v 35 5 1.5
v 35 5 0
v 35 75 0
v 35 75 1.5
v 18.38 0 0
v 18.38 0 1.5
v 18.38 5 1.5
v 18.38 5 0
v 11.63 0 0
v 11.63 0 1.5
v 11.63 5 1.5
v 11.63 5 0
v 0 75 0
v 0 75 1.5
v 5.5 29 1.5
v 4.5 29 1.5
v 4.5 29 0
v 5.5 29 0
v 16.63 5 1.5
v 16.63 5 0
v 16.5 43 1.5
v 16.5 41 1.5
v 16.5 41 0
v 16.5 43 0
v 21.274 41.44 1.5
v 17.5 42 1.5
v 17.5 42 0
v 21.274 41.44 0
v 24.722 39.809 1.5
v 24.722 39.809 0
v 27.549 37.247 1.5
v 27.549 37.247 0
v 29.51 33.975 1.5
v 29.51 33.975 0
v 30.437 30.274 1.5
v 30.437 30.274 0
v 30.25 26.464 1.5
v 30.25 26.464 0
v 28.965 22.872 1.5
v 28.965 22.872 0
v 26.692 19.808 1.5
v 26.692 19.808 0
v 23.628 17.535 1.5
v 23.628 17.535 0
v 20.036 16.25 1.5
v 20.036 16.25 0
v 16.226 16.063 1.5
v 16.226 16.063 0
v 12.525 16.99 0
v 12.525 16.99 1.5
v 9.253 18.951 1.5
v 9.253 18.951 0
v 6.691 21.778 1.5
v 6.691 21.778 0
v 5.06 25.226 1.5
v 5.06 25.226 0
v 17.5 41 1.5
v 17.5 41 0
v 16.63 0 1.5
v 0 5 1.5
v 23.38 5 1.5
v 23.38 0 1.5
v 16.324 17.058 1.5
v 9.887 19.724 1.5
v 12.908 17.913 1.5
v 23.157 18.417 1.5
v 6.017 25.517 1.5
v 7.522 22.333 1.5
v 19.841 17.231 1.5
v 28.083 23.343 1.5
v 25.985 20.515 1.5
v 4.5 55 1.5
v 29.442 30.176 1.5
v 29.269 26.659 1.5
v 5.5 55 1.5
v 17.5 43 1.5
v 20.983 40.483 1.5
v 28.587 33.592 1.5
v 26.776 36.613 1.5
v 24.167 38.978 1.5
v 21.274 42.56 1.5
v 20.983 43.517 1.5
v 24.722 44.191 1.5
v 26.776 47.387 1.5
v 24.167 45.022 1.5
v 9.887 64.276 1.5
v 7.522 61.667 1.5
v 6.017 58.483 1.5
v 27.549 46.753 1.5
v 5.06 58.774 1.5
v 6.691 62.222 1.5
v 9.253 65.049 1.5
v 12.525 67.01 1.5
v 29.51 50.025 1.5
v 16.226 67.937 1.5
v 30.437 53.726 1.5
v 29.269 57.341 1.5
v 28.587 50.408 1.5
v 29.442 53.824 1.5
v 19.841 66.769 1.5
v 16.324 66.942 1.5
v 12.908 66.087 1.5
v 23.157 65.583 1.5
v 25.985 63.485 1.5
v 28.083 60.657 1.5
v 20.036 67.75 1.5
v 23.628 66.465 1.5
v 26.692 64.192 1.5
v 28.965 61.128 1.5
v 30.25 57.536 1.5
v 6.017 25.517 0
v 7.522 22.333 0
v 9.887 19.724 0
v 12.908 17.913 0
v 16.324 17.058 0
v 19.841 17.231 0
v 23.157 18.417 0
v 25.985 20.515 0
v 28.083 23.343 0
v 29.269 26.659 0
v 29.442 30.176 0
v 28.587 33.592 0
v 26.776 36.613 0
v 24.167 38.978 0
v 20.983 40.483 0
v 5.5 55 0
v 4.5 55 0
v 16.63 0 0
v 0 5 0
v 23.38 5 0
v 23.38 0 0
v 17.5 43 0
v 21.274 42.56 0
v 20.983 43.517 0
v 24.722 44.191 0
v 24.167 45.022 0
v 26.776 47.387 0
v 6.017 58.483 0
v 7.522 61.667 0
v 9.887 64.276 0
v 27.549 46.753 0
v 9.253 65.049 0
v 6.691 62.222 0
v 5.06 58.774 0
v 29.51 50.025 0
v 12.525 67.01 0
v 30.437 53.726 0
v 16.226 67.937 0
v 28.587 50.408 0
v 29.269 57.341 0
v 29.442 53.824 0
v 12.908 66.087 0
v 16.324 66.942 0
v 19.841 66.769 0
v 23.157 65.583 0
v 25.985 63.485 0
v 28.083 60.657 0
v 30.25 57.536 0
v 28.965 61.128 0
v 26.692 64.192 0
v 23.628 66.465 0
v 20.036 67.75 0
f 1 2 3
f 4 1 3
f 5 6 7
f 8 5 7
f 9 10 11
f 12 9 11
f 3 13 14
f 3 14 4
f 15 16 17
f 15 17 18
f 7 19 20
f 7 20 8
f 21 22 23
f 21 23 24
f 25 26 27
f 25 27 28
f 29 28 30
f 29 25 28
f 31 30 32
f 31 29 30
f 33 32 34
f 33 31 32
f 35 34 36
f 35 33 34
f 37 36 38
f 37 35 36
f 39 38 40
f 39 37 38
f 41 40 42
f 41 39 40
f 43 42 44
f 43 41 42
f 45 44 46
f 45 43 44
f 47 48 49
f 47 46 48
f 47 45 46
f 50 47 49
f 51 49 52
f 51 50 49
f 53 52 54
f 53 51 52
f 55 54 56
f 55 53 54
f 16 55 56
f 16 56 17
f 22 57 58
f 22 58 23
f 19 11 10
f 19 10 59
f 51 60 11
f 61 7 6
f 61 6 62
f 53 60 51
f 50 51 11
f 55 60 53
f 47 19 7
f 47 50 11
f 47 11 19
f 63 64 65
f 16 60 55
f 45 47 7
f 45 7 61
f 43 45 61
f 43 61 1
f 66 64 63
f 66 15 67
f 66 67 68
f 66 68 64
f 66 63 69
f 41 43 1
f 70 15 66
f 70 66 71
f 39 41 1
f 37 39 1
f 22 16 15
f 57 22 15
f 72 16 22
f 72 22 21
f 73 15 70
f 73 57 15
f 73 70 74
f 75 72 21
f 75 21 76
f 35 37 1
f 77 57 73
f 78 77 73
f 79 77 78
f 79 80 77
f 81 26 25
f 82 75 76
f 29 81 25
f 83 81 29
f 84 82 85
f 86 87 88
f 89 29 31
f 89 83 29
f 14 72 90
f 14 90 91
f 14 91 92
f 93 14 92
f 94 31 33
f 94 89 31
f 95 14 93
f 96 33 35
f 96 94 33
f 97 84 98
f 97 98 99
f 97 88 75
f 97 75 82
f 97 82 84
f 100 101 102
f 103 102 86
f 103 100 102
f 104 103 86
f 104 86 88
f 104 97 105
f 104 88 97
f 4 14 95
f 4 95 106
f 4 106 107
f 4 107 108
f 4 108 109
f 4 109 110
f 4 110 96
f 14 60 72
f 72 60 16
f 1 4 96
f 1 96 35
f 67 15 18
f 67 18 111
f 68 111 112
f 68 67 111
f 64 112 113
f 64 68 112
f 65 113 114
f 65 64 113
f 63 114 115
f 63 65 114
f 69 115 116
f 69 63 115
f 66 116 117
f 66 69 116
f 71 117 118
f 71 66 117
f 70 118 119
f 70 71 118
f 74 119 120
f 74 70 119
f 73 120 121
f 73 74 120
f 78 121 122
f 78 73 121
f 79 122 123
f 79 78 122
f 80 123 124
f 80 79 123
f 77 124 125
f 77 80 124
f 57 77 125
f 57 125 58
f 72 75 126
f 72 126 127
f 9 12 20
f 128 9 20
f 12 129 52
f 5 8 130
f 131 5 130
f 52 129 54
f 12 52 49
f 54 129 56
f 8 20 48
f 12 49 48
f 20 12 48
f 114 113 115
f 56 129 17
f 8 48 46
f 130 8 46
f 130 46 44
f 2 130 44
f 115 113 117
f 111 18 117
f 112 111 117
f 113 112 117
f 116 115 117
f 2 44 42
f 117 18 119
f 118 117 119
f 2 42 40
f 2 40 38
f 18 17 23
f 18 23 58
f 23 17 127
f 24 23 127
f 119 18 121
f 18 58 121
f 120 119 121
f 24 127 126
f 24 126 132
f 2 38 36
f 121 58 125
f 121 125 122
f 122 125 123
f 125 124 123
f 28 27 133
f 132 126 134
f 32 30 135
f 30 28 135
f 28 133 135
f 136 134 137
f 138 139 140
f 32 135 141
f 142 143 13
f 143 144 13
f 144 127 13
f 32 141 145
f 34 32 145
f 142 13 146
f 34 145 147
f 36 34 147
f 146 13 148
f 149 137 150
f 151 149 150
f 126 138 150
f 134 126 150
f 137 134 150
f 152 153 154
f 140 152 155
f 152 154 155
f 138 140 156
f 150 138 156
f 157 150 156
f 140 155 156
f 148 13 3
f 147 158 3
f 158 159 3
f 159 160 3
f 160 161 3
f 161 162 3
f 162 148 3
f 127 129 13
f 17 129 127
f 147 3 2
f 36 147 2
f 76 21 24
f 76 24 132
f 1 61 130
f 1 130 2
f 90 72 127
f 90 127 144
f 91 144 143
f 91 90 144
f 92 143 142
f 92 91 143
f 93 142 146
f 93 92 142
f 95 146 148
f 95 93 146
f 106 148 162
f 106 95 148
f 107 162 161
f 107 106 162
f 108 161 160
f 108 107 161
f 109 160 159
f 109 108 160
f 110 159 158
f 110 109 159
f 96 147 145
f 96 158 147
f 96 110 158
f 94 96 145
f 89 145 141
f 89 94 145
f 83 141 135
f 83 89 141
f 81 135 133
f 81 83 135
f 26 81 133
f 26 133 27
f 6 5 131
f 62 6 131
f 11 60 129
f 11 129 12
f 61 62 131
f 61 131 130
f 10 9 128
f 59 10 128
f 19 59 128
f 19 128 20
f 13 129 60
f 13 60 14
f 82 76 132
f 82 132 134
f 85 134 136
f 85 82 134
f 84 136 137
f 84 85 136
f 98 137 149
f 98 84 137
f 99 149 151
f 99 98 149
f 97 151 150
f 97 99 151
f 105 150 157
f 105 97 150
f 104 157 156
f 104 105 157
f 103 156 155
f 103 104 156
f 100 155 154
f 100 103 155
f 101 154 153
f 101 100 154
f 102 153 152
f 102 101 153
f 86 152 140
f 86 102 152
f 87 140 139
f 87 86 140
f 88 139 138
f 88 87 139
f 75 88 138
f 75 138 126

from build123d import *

# Parameters (mm, degrees)
SKIZZE1_W                       = 35
SKIZZE1_H                       = 75
AUFSATZ_LINEAR_AUSTRAGEN1_DEPTH = 1.5
SKIZZE2_W                       = 11.63
SKIZZE2_H                       = 5
SKIZZE2_W_2                     = 11.62
SKIZZE2_W_3                     = 1.75
SCHNITT_LINEAR_AUSTRAGEN1_DEPTH = 1.5
SCHNITT_LINEAR_AUSTRAGEN4_DEPTH = 20


with BuildPart() as part:
    # Skizze1 → Aufsatz-Linear austragen1 (new body)
    with BuildSketch(Plane.XY):
        with Locations((17.5, 37.5)):
            Rectangle(SKIZZE1_W, SKIZZE1_H)
    extrude(amount=AUFSATZ_LINEAR_AUSTRAGEN1_DEPTH)

    # Skizze2 → Schnitt-Linear austragen1 (cut)
    with BuildSketch(Plane.XY.offset(1.5)):
        with Locations((5.815, 2.5)):
            Rectangle(SKIZZE2_W, SKIZZE2_H)
        with Locations((29.19, 2.5)):
            Rectangle(SKIZZE2_W_2, SKIZZE2_H)
        with Locations((17.505, 2.5)):
            Rectangle(SKIZZE2_W_3, SKIZZE2_H)
    extrude(amount=-SCHNITT_LINEAR_AUSTRAGEN1_DEPTH, mode=Mode.SUBTRACT)

    # Skizze9 → Schnitt-Linear austragen4 (cut)
    with BuildSketch(Plane.XY.offset(1.5)):
        with BuildLine():
            Line((5.5, 55), (4.5, 55))
            ThreePointArc((4.5, 55), (26.692388155, 64.192388155), (17.5, 42))
            ThreePointArc((17.5, 42), (26.692388155, 19.807611845), (4.5, 29))
            Line((4.5, 29), (5.5, 29))
            ThreePointArc((5.5, 29), (25.985281374, 20.514718626), (17.5, 41))
            Line((17.5, 41), (16.5, 41))
            Line((16.5, 41), (16.5, 43))
            Line((16.5, 43), (17.5, 43))
            ThreePointArc((17.5, 43), (25.985281374, 63.485281374), (5.5, 55))
        make_face()
    extrude(amount=-SCHNITT_LINEAR_AUSTRAGEN4_DEPTH, mode=Mode.SUBTRACT)


solid = part.part
